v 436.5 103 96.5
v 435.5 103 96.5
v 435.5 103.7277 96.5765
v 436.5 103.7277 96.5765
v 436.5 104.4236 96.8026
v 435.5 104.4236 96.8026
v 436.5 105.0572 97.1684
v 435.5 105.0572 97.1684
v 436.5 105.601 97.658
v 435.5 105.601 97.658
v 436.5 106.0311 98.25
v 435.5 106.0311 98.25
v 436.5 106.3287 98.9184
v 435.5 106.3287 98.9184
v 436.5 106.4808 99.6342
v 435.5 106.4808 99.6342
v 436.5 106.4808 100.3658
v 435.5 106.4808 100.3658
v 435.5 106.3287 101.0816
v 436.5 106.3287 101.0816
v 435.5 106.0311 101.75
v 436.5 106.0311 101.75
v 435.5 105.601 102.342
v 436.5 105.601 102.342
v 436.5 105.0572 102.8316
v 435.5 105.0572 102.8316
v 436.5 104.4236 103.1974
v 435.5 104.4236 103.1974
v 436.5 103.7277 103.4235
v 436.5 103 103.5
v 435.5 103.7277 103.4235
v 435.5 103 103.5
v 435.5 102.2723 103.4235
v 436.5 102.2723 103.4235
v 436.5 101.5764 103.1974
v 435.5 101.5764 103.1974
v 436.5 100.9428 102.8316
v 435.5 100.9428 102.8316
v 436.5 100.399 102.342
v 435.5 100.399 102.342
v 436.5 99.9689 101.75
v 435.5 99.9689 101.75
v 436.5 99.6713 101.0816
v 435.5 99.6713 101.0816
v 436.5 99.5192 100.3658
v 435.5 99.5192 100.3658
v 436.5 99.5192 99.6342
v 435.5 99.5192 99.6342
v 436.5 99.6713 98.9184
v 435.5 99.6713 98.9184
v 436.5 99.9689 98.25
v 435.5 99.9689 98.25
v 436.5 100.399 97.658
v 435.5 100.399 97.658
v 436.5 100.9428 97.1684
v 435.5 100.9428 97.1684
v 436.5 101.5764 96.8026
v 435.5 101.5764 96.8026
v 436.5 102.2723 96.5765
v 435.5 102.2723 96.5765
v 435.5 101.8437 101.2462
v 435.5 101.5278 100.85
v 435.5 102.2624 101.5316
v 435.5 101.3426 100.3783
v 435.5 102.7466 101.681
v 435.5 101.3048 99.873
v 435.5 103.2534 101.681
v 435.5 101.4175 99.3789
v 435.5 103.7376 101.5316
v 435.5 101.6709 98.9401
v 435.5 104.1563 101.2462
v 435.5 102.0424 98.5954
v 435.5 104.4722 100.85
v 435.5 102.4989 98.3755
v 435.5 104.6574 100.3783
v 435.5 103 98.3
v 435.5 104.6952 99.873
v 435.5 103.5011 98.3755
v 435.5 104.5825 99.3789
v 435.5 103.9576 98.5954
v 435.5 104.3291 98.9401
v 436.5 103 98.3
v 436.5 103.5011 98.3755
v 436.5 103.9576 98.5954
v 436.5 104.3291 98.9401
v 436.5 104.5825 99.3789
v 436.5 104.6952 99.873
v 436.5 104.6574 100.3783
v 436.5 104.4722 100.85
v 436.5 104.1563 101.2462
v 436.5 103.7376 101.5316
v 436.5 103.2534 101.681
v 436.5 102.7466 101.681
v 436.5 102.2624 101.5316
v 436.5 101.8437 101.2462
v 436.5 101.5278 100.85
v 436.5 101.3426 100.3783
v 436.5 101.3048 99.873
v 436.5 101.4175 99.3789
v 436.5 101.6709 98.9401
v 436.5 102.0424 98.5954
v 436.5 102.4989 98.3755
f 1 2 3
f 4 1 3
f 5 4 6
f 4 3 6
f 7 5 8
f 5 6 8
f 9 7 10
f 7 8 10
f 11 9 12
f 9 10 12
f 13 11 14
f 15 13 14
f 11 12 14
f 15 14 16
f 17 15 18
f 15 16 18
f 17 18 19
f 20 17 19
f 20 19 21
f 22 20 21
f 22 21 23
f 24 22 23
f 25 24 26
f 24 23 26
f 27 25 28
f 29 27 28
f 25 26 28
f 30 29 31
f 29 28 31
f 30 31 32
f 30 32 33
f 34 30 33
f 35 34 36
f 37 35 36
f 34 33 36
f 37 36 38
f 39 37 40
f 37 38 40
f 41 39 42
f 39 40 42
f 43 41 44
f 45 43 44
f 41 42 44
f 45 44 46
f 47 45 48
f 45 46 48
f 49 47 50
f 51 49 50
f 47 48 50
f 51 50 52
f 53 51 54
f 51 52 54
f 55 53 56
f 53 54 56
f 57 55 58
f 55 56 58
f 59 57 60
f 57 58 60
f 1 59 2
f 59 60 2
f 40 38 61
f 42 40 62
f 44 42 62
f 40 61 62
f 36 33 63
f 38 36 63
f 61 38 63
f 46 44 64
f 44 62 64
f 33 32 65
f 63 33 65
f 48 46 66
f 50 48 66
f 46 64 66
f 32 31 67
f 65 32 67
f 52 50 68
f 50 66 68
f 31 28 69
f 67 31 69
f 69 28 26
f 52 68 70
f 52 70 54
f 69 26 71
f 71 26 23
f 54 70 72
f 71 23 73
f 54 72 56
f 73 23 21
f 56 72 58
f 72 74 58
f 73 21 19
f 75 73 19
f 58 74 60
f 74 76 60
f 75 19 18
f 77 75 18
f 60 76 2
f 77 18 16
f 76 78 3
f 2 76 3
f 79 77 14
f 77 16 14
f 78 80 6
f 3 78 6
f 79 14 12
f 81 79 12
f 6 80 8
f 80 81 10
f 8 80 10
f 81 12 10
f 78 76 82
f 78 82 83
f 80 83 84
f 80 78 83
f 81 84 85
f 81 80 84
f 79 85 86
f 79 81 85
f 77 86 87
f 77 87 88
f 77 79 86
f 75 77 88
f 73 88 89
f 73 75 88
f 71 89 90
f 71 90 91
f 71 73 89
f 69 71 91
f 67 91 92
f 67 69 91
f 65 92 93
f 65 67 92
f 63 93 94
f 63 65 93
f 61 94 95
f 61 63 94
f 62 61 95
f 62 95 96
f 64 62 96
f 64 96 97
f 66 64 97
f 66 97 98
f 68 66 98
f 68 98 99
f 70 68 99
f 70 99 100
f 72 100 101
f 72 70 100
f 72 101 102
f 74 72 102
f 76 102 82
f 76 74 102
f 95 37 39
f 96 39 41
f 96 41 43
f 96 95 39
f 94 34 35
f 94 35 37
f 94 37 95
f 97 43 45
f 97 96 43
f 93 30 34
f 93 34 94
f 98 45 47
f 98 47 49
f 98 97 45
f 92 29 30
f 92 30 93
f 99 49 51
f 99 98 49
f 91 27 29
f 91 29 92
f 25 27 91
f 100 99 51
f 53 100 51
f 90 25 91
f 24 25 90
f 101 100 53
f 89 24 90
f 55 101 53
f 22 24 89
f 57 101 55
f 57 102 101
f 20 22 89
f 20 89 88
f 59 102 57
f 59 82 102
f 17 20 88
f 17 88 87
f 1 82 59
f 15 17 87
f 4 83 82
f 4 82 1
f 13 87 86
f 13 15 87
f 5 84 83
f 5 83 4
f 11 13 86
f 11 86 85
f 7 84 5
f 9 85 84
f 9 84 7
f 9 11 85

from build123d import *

# Parameters (mm, degrees)
CYLINDER1388_R     = 1.7
CYLINDER1388_DEPTH = 1
CYLINDER1386_R     = 3.5
CYLINDER1386_DEPTH = 1


with BuildPart() as cylinder1388:
    # Cylinder1388 → Cylinder1388 (new body)
    with BuildSketch(Plane(origin=(436, 103, 100), x_dir=(0, 0, -1), z_dir=(1, 0, 0))):
        Circle(CYLINDER1388_R)
    extrude(amount=CYLINDER1388_DEPTH)


with BuildPart() as bucket_left_half_short_spacer:
    # Cylinder1386 → Cylinder1386 (new body)
    with BuildSketch(Plane(origin=(436, 103, 100), x_dir=(0, 0, -1), z_dir=(1, 0, 0))):
        Circle(CYLINDER1386_R)
    extrude(amount=CYLINDER1386_DEPTH)

    # Cut014355: cut Cylinder1388
    add(cylinder1388.part, mode=Mode.SUBTRACT)


with BuildPart() as bucket_left_half_short_spacer_1:
    # Cut014355 placement: moved
    add(bucket_left_half_short_spacer.part.moved(Location((-0.5, 0, 0))))


solid = bucket_left_half_short_spacer_1.part
